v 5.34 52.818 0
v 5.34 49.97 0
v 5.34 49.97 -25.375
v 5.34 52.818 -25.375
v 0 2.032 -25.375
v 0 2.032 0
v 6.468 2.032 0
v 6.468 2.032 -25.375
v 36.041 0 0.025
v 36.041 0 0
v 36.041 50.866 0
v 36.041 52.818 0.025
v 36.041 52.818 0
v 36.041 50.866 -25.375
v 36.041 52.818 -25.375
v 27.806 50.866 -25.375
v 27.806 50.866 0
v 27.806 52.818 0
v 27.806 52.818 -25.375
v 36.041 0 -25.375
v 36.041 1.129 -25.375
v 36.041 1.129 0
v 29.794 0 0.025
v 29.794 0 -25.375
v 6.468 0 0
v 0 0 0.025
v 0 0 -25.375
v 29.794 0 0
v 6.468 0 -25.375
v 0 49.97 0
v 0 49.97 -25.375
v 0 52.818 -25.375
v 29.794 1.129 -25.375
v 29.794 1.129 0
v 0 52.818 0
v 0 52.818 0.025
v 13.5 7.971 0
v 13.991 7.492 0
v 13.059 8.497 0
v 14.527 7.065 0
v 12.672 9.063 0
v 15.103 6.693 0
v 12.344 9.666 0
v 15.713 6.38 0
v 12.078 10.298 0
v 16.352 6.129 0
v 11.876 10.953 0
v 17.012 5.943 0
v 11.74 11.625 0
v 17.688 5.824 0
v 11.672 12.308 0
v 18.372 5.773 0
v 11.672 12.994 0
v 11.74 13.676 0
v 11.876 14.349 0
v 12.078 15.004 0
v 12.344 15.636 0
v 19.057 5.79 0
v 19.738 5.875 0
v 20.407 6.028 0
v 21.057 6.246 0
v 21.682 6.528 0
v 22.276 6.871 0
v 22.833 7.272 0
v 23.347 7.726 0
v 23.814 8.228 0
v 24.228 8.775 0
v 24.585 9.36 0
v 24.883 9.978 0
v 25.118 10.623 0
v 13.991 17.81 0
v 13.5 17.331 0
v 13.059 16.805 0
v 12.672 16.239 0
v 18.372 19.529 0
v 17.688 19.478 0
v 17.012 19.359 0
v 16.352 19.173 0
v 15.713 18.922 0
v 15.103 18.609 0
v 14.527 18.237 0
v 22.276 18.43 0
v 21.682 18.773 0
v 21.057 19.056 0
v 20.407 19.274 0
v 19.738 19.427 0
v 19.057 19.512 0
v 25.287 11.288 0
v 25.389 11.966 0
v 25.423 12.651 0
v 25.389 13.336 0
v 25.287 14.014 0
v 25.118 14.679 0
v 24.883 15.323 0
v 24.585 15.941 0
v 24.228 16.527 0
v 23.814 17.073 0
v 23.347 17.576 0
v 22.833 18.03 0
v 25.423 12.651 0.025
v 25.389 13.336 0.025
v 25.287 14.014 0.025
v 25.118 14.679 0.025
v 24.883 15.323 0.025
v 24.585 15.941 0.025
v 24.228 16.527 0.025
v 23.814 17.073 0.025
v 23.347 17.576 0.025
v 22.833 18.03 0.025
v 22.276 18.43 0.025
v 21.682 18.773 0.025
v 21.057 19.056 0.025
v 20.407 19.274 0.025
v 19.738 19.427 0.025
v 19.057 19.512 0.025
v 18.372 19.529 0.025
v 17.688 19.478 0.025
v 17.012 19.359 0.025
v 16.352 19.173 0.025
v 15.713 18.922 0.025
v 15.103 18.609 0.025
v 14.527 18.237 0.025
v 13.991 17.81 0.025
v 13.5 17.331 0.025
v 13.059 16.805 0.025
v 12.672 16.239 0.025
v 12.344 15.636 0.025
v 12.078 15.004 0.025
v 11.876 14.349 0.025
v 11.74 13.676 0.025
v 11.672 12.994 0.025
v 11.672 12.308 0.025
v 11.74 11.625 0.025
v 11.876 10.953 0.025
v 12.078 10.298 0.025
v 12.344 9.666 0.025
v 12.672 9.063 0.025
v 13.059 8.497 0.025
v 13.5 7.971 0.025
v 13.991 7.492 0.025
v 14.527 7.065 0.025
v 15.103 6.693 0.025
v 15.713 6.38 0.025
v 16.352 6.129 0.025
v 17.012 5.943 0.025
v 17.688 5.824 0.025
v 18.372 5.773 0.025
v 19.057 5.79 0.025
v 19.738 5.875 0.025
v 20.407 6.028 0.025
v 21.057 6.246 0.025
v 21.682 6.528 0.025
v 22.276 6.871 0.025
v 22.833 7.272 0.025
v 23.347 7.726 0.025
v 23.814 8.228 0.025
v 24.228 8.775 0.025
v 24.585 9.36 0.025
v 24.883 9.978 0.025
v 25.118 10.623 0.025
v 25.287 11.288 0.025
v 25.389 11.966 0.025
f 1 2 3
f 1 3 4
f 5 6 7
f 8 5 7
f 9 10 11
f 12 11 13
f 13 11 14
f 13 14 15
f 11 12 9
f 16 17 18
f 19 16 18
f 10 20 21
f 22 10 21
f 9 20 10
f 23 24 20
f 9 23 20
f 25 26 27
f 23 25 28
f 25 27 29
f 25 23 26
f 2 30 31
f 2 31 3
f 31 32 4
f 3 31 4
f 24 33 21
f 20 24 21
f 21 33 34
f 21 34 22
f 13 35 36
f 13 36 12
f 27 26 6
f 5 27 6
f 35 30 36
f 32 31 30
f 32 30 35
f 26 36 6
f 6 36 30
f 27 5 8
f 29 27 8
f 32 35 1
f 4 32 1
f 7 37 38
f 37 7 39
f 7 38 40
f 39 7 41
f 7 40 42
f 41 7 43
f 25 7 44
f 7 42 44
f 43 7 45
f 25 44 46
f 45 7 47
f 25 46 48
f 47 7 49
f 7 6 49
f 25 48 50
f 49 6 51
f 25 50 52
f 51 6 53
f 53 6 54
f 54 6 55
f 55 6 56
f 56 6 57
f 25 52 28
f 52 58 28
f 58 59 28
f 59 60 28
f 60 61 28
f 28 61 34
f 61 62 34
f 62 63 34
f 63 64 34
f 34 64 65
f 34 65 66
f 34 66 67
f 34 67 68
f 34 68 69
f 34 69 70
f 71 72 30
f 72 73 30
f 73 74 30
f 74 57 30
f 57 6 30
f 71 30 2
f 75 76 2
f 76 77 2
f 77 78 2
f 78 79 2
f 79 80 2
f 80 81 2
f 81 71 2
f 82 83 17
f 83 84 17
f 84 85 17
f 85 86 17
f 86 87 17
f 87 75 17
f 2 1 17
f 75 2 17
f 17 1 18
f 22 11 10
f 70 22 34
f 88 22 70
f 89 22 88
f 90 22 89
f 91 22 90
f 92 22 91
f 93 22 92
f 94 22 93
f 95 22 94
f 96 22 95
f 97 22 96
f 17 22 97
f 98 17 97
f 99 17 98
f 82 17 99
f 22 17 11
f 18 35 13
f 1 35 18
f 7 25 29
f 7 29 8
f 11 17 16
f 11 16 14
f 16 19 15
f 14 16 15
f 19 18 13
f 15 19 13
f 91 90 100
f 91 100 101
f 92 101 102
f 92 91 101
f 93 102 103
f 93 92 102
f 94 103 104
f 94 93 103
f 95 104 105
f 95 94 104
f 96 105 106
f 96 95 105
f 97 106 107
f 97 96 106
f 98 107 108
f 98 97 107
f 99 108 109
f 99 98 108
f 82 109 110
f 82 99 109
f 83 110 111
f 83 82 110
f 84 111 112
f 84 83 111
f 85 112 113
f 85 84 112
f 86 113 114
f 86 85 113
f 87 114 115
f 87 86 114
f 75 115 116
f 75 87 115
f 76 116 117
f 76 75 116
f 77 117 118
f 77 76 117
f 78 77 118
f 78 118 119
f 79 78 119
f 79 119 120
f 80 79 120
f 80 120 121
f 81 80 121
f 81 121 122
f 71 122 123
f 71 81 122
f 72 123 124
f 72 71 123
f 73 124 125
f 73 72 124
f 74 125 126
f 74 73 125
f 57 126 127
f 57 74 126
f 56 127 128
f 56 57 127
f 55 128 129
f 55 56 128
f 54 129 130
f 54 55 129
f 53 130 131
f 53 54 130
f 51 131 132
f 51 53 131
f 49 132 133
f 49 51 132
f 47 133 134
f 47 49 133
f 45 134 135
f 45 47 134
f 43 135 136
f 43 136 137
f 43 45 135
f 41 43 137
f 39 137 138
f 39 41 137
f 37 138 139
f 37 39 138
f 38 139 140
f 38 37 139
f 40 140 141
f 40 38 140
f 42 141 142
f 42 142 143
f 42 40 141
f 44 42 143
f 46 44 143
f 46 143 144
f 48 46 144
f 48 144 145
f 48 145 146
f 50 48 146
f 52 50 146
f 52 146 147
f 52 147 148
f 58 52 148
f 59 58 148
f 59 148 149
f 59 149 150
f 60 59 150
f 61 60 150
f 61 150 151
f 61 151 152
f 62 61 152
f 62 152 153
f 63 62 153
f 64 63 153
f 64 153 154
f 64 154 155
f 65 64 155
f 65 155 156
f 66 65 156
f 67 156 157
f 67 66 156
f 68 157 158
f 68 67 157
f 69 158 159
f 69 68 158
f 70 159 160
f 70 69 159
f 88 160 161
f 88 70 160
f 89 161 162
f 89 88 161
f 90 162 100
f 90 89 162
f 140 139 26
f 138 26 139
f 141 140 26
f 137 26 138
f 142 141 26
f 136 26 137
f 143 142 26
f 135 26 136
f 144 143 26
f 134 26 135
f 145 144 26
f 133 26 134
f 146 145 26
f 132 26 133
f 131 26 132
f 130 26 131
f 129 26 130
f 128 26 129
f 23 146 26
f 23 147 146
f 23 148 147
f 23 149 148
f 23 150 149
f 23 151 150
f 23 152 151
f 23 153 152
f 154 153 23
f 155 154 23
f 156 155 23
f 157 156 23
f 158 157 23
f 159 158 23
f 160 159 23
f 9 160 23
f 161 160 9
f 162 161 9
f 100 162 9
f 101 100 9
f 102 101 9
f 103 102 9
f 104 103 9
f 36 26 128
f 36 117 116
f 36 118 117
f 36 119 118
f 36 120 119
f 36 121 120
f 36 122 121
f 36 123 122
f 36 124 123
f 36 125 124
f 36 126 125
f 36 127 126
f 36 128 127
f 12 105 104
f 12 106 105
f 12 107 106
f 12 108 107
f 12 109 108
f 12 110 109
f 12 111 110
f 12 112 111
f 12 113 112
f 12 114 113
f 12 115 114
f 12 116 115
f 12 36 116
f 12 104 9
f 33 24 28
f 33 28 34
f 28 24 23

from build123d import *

# Parameters (mm, degrees)
F0_W     = 36.041372
F0_H     = 52.817661
F0_R     = 6.880185
F1_DEPTH = 0.0254
F2_W     = 6.246955
F2_H     = 1.12941
F2_W_2   = 6.467774
F2_H_2   = 2.031927
F2_W_3   = 8.2353
F2_H_3   = 1.951657
F2_W_4   = 5.340438
F2_H_4   = 2.847552
F3_DEPTH = 25.4


with BuildPart() as f1:
    # F0 (on Top) → F1 (new body)
    with BuildSketch(Plane.XY):
        with Locations((18.020686, 26.408831)):
            Rectangle(F0_W, F0_H)
        with Locations((18.543148, 12.65093)):
            Circle(F0_R, mode=Mode.SUBTRACT)
    extrude(amount=F1_DEPTH)

    # F2 (on face) → F3 (join)
    with BuildSketch(Plane.XY.offset(0.0254)):
        with Locations((32.917894, 0.564705)):
            Rectangle(F2_W, F2_H)
        with Locations((3.233887, 1.015964)):
            Rectangle(F2_W_2, F2_H_2)
        with Locations((31.923722, 51.841832)):
            Rectangle(F2_W_3, F2_H_3)
        with Locations((2.670219, 51.393885)):
            Rectangle(F2_W_4, F2_H_4)
    extrude(amount=-F3_DEPTH)


solid = f1.part
